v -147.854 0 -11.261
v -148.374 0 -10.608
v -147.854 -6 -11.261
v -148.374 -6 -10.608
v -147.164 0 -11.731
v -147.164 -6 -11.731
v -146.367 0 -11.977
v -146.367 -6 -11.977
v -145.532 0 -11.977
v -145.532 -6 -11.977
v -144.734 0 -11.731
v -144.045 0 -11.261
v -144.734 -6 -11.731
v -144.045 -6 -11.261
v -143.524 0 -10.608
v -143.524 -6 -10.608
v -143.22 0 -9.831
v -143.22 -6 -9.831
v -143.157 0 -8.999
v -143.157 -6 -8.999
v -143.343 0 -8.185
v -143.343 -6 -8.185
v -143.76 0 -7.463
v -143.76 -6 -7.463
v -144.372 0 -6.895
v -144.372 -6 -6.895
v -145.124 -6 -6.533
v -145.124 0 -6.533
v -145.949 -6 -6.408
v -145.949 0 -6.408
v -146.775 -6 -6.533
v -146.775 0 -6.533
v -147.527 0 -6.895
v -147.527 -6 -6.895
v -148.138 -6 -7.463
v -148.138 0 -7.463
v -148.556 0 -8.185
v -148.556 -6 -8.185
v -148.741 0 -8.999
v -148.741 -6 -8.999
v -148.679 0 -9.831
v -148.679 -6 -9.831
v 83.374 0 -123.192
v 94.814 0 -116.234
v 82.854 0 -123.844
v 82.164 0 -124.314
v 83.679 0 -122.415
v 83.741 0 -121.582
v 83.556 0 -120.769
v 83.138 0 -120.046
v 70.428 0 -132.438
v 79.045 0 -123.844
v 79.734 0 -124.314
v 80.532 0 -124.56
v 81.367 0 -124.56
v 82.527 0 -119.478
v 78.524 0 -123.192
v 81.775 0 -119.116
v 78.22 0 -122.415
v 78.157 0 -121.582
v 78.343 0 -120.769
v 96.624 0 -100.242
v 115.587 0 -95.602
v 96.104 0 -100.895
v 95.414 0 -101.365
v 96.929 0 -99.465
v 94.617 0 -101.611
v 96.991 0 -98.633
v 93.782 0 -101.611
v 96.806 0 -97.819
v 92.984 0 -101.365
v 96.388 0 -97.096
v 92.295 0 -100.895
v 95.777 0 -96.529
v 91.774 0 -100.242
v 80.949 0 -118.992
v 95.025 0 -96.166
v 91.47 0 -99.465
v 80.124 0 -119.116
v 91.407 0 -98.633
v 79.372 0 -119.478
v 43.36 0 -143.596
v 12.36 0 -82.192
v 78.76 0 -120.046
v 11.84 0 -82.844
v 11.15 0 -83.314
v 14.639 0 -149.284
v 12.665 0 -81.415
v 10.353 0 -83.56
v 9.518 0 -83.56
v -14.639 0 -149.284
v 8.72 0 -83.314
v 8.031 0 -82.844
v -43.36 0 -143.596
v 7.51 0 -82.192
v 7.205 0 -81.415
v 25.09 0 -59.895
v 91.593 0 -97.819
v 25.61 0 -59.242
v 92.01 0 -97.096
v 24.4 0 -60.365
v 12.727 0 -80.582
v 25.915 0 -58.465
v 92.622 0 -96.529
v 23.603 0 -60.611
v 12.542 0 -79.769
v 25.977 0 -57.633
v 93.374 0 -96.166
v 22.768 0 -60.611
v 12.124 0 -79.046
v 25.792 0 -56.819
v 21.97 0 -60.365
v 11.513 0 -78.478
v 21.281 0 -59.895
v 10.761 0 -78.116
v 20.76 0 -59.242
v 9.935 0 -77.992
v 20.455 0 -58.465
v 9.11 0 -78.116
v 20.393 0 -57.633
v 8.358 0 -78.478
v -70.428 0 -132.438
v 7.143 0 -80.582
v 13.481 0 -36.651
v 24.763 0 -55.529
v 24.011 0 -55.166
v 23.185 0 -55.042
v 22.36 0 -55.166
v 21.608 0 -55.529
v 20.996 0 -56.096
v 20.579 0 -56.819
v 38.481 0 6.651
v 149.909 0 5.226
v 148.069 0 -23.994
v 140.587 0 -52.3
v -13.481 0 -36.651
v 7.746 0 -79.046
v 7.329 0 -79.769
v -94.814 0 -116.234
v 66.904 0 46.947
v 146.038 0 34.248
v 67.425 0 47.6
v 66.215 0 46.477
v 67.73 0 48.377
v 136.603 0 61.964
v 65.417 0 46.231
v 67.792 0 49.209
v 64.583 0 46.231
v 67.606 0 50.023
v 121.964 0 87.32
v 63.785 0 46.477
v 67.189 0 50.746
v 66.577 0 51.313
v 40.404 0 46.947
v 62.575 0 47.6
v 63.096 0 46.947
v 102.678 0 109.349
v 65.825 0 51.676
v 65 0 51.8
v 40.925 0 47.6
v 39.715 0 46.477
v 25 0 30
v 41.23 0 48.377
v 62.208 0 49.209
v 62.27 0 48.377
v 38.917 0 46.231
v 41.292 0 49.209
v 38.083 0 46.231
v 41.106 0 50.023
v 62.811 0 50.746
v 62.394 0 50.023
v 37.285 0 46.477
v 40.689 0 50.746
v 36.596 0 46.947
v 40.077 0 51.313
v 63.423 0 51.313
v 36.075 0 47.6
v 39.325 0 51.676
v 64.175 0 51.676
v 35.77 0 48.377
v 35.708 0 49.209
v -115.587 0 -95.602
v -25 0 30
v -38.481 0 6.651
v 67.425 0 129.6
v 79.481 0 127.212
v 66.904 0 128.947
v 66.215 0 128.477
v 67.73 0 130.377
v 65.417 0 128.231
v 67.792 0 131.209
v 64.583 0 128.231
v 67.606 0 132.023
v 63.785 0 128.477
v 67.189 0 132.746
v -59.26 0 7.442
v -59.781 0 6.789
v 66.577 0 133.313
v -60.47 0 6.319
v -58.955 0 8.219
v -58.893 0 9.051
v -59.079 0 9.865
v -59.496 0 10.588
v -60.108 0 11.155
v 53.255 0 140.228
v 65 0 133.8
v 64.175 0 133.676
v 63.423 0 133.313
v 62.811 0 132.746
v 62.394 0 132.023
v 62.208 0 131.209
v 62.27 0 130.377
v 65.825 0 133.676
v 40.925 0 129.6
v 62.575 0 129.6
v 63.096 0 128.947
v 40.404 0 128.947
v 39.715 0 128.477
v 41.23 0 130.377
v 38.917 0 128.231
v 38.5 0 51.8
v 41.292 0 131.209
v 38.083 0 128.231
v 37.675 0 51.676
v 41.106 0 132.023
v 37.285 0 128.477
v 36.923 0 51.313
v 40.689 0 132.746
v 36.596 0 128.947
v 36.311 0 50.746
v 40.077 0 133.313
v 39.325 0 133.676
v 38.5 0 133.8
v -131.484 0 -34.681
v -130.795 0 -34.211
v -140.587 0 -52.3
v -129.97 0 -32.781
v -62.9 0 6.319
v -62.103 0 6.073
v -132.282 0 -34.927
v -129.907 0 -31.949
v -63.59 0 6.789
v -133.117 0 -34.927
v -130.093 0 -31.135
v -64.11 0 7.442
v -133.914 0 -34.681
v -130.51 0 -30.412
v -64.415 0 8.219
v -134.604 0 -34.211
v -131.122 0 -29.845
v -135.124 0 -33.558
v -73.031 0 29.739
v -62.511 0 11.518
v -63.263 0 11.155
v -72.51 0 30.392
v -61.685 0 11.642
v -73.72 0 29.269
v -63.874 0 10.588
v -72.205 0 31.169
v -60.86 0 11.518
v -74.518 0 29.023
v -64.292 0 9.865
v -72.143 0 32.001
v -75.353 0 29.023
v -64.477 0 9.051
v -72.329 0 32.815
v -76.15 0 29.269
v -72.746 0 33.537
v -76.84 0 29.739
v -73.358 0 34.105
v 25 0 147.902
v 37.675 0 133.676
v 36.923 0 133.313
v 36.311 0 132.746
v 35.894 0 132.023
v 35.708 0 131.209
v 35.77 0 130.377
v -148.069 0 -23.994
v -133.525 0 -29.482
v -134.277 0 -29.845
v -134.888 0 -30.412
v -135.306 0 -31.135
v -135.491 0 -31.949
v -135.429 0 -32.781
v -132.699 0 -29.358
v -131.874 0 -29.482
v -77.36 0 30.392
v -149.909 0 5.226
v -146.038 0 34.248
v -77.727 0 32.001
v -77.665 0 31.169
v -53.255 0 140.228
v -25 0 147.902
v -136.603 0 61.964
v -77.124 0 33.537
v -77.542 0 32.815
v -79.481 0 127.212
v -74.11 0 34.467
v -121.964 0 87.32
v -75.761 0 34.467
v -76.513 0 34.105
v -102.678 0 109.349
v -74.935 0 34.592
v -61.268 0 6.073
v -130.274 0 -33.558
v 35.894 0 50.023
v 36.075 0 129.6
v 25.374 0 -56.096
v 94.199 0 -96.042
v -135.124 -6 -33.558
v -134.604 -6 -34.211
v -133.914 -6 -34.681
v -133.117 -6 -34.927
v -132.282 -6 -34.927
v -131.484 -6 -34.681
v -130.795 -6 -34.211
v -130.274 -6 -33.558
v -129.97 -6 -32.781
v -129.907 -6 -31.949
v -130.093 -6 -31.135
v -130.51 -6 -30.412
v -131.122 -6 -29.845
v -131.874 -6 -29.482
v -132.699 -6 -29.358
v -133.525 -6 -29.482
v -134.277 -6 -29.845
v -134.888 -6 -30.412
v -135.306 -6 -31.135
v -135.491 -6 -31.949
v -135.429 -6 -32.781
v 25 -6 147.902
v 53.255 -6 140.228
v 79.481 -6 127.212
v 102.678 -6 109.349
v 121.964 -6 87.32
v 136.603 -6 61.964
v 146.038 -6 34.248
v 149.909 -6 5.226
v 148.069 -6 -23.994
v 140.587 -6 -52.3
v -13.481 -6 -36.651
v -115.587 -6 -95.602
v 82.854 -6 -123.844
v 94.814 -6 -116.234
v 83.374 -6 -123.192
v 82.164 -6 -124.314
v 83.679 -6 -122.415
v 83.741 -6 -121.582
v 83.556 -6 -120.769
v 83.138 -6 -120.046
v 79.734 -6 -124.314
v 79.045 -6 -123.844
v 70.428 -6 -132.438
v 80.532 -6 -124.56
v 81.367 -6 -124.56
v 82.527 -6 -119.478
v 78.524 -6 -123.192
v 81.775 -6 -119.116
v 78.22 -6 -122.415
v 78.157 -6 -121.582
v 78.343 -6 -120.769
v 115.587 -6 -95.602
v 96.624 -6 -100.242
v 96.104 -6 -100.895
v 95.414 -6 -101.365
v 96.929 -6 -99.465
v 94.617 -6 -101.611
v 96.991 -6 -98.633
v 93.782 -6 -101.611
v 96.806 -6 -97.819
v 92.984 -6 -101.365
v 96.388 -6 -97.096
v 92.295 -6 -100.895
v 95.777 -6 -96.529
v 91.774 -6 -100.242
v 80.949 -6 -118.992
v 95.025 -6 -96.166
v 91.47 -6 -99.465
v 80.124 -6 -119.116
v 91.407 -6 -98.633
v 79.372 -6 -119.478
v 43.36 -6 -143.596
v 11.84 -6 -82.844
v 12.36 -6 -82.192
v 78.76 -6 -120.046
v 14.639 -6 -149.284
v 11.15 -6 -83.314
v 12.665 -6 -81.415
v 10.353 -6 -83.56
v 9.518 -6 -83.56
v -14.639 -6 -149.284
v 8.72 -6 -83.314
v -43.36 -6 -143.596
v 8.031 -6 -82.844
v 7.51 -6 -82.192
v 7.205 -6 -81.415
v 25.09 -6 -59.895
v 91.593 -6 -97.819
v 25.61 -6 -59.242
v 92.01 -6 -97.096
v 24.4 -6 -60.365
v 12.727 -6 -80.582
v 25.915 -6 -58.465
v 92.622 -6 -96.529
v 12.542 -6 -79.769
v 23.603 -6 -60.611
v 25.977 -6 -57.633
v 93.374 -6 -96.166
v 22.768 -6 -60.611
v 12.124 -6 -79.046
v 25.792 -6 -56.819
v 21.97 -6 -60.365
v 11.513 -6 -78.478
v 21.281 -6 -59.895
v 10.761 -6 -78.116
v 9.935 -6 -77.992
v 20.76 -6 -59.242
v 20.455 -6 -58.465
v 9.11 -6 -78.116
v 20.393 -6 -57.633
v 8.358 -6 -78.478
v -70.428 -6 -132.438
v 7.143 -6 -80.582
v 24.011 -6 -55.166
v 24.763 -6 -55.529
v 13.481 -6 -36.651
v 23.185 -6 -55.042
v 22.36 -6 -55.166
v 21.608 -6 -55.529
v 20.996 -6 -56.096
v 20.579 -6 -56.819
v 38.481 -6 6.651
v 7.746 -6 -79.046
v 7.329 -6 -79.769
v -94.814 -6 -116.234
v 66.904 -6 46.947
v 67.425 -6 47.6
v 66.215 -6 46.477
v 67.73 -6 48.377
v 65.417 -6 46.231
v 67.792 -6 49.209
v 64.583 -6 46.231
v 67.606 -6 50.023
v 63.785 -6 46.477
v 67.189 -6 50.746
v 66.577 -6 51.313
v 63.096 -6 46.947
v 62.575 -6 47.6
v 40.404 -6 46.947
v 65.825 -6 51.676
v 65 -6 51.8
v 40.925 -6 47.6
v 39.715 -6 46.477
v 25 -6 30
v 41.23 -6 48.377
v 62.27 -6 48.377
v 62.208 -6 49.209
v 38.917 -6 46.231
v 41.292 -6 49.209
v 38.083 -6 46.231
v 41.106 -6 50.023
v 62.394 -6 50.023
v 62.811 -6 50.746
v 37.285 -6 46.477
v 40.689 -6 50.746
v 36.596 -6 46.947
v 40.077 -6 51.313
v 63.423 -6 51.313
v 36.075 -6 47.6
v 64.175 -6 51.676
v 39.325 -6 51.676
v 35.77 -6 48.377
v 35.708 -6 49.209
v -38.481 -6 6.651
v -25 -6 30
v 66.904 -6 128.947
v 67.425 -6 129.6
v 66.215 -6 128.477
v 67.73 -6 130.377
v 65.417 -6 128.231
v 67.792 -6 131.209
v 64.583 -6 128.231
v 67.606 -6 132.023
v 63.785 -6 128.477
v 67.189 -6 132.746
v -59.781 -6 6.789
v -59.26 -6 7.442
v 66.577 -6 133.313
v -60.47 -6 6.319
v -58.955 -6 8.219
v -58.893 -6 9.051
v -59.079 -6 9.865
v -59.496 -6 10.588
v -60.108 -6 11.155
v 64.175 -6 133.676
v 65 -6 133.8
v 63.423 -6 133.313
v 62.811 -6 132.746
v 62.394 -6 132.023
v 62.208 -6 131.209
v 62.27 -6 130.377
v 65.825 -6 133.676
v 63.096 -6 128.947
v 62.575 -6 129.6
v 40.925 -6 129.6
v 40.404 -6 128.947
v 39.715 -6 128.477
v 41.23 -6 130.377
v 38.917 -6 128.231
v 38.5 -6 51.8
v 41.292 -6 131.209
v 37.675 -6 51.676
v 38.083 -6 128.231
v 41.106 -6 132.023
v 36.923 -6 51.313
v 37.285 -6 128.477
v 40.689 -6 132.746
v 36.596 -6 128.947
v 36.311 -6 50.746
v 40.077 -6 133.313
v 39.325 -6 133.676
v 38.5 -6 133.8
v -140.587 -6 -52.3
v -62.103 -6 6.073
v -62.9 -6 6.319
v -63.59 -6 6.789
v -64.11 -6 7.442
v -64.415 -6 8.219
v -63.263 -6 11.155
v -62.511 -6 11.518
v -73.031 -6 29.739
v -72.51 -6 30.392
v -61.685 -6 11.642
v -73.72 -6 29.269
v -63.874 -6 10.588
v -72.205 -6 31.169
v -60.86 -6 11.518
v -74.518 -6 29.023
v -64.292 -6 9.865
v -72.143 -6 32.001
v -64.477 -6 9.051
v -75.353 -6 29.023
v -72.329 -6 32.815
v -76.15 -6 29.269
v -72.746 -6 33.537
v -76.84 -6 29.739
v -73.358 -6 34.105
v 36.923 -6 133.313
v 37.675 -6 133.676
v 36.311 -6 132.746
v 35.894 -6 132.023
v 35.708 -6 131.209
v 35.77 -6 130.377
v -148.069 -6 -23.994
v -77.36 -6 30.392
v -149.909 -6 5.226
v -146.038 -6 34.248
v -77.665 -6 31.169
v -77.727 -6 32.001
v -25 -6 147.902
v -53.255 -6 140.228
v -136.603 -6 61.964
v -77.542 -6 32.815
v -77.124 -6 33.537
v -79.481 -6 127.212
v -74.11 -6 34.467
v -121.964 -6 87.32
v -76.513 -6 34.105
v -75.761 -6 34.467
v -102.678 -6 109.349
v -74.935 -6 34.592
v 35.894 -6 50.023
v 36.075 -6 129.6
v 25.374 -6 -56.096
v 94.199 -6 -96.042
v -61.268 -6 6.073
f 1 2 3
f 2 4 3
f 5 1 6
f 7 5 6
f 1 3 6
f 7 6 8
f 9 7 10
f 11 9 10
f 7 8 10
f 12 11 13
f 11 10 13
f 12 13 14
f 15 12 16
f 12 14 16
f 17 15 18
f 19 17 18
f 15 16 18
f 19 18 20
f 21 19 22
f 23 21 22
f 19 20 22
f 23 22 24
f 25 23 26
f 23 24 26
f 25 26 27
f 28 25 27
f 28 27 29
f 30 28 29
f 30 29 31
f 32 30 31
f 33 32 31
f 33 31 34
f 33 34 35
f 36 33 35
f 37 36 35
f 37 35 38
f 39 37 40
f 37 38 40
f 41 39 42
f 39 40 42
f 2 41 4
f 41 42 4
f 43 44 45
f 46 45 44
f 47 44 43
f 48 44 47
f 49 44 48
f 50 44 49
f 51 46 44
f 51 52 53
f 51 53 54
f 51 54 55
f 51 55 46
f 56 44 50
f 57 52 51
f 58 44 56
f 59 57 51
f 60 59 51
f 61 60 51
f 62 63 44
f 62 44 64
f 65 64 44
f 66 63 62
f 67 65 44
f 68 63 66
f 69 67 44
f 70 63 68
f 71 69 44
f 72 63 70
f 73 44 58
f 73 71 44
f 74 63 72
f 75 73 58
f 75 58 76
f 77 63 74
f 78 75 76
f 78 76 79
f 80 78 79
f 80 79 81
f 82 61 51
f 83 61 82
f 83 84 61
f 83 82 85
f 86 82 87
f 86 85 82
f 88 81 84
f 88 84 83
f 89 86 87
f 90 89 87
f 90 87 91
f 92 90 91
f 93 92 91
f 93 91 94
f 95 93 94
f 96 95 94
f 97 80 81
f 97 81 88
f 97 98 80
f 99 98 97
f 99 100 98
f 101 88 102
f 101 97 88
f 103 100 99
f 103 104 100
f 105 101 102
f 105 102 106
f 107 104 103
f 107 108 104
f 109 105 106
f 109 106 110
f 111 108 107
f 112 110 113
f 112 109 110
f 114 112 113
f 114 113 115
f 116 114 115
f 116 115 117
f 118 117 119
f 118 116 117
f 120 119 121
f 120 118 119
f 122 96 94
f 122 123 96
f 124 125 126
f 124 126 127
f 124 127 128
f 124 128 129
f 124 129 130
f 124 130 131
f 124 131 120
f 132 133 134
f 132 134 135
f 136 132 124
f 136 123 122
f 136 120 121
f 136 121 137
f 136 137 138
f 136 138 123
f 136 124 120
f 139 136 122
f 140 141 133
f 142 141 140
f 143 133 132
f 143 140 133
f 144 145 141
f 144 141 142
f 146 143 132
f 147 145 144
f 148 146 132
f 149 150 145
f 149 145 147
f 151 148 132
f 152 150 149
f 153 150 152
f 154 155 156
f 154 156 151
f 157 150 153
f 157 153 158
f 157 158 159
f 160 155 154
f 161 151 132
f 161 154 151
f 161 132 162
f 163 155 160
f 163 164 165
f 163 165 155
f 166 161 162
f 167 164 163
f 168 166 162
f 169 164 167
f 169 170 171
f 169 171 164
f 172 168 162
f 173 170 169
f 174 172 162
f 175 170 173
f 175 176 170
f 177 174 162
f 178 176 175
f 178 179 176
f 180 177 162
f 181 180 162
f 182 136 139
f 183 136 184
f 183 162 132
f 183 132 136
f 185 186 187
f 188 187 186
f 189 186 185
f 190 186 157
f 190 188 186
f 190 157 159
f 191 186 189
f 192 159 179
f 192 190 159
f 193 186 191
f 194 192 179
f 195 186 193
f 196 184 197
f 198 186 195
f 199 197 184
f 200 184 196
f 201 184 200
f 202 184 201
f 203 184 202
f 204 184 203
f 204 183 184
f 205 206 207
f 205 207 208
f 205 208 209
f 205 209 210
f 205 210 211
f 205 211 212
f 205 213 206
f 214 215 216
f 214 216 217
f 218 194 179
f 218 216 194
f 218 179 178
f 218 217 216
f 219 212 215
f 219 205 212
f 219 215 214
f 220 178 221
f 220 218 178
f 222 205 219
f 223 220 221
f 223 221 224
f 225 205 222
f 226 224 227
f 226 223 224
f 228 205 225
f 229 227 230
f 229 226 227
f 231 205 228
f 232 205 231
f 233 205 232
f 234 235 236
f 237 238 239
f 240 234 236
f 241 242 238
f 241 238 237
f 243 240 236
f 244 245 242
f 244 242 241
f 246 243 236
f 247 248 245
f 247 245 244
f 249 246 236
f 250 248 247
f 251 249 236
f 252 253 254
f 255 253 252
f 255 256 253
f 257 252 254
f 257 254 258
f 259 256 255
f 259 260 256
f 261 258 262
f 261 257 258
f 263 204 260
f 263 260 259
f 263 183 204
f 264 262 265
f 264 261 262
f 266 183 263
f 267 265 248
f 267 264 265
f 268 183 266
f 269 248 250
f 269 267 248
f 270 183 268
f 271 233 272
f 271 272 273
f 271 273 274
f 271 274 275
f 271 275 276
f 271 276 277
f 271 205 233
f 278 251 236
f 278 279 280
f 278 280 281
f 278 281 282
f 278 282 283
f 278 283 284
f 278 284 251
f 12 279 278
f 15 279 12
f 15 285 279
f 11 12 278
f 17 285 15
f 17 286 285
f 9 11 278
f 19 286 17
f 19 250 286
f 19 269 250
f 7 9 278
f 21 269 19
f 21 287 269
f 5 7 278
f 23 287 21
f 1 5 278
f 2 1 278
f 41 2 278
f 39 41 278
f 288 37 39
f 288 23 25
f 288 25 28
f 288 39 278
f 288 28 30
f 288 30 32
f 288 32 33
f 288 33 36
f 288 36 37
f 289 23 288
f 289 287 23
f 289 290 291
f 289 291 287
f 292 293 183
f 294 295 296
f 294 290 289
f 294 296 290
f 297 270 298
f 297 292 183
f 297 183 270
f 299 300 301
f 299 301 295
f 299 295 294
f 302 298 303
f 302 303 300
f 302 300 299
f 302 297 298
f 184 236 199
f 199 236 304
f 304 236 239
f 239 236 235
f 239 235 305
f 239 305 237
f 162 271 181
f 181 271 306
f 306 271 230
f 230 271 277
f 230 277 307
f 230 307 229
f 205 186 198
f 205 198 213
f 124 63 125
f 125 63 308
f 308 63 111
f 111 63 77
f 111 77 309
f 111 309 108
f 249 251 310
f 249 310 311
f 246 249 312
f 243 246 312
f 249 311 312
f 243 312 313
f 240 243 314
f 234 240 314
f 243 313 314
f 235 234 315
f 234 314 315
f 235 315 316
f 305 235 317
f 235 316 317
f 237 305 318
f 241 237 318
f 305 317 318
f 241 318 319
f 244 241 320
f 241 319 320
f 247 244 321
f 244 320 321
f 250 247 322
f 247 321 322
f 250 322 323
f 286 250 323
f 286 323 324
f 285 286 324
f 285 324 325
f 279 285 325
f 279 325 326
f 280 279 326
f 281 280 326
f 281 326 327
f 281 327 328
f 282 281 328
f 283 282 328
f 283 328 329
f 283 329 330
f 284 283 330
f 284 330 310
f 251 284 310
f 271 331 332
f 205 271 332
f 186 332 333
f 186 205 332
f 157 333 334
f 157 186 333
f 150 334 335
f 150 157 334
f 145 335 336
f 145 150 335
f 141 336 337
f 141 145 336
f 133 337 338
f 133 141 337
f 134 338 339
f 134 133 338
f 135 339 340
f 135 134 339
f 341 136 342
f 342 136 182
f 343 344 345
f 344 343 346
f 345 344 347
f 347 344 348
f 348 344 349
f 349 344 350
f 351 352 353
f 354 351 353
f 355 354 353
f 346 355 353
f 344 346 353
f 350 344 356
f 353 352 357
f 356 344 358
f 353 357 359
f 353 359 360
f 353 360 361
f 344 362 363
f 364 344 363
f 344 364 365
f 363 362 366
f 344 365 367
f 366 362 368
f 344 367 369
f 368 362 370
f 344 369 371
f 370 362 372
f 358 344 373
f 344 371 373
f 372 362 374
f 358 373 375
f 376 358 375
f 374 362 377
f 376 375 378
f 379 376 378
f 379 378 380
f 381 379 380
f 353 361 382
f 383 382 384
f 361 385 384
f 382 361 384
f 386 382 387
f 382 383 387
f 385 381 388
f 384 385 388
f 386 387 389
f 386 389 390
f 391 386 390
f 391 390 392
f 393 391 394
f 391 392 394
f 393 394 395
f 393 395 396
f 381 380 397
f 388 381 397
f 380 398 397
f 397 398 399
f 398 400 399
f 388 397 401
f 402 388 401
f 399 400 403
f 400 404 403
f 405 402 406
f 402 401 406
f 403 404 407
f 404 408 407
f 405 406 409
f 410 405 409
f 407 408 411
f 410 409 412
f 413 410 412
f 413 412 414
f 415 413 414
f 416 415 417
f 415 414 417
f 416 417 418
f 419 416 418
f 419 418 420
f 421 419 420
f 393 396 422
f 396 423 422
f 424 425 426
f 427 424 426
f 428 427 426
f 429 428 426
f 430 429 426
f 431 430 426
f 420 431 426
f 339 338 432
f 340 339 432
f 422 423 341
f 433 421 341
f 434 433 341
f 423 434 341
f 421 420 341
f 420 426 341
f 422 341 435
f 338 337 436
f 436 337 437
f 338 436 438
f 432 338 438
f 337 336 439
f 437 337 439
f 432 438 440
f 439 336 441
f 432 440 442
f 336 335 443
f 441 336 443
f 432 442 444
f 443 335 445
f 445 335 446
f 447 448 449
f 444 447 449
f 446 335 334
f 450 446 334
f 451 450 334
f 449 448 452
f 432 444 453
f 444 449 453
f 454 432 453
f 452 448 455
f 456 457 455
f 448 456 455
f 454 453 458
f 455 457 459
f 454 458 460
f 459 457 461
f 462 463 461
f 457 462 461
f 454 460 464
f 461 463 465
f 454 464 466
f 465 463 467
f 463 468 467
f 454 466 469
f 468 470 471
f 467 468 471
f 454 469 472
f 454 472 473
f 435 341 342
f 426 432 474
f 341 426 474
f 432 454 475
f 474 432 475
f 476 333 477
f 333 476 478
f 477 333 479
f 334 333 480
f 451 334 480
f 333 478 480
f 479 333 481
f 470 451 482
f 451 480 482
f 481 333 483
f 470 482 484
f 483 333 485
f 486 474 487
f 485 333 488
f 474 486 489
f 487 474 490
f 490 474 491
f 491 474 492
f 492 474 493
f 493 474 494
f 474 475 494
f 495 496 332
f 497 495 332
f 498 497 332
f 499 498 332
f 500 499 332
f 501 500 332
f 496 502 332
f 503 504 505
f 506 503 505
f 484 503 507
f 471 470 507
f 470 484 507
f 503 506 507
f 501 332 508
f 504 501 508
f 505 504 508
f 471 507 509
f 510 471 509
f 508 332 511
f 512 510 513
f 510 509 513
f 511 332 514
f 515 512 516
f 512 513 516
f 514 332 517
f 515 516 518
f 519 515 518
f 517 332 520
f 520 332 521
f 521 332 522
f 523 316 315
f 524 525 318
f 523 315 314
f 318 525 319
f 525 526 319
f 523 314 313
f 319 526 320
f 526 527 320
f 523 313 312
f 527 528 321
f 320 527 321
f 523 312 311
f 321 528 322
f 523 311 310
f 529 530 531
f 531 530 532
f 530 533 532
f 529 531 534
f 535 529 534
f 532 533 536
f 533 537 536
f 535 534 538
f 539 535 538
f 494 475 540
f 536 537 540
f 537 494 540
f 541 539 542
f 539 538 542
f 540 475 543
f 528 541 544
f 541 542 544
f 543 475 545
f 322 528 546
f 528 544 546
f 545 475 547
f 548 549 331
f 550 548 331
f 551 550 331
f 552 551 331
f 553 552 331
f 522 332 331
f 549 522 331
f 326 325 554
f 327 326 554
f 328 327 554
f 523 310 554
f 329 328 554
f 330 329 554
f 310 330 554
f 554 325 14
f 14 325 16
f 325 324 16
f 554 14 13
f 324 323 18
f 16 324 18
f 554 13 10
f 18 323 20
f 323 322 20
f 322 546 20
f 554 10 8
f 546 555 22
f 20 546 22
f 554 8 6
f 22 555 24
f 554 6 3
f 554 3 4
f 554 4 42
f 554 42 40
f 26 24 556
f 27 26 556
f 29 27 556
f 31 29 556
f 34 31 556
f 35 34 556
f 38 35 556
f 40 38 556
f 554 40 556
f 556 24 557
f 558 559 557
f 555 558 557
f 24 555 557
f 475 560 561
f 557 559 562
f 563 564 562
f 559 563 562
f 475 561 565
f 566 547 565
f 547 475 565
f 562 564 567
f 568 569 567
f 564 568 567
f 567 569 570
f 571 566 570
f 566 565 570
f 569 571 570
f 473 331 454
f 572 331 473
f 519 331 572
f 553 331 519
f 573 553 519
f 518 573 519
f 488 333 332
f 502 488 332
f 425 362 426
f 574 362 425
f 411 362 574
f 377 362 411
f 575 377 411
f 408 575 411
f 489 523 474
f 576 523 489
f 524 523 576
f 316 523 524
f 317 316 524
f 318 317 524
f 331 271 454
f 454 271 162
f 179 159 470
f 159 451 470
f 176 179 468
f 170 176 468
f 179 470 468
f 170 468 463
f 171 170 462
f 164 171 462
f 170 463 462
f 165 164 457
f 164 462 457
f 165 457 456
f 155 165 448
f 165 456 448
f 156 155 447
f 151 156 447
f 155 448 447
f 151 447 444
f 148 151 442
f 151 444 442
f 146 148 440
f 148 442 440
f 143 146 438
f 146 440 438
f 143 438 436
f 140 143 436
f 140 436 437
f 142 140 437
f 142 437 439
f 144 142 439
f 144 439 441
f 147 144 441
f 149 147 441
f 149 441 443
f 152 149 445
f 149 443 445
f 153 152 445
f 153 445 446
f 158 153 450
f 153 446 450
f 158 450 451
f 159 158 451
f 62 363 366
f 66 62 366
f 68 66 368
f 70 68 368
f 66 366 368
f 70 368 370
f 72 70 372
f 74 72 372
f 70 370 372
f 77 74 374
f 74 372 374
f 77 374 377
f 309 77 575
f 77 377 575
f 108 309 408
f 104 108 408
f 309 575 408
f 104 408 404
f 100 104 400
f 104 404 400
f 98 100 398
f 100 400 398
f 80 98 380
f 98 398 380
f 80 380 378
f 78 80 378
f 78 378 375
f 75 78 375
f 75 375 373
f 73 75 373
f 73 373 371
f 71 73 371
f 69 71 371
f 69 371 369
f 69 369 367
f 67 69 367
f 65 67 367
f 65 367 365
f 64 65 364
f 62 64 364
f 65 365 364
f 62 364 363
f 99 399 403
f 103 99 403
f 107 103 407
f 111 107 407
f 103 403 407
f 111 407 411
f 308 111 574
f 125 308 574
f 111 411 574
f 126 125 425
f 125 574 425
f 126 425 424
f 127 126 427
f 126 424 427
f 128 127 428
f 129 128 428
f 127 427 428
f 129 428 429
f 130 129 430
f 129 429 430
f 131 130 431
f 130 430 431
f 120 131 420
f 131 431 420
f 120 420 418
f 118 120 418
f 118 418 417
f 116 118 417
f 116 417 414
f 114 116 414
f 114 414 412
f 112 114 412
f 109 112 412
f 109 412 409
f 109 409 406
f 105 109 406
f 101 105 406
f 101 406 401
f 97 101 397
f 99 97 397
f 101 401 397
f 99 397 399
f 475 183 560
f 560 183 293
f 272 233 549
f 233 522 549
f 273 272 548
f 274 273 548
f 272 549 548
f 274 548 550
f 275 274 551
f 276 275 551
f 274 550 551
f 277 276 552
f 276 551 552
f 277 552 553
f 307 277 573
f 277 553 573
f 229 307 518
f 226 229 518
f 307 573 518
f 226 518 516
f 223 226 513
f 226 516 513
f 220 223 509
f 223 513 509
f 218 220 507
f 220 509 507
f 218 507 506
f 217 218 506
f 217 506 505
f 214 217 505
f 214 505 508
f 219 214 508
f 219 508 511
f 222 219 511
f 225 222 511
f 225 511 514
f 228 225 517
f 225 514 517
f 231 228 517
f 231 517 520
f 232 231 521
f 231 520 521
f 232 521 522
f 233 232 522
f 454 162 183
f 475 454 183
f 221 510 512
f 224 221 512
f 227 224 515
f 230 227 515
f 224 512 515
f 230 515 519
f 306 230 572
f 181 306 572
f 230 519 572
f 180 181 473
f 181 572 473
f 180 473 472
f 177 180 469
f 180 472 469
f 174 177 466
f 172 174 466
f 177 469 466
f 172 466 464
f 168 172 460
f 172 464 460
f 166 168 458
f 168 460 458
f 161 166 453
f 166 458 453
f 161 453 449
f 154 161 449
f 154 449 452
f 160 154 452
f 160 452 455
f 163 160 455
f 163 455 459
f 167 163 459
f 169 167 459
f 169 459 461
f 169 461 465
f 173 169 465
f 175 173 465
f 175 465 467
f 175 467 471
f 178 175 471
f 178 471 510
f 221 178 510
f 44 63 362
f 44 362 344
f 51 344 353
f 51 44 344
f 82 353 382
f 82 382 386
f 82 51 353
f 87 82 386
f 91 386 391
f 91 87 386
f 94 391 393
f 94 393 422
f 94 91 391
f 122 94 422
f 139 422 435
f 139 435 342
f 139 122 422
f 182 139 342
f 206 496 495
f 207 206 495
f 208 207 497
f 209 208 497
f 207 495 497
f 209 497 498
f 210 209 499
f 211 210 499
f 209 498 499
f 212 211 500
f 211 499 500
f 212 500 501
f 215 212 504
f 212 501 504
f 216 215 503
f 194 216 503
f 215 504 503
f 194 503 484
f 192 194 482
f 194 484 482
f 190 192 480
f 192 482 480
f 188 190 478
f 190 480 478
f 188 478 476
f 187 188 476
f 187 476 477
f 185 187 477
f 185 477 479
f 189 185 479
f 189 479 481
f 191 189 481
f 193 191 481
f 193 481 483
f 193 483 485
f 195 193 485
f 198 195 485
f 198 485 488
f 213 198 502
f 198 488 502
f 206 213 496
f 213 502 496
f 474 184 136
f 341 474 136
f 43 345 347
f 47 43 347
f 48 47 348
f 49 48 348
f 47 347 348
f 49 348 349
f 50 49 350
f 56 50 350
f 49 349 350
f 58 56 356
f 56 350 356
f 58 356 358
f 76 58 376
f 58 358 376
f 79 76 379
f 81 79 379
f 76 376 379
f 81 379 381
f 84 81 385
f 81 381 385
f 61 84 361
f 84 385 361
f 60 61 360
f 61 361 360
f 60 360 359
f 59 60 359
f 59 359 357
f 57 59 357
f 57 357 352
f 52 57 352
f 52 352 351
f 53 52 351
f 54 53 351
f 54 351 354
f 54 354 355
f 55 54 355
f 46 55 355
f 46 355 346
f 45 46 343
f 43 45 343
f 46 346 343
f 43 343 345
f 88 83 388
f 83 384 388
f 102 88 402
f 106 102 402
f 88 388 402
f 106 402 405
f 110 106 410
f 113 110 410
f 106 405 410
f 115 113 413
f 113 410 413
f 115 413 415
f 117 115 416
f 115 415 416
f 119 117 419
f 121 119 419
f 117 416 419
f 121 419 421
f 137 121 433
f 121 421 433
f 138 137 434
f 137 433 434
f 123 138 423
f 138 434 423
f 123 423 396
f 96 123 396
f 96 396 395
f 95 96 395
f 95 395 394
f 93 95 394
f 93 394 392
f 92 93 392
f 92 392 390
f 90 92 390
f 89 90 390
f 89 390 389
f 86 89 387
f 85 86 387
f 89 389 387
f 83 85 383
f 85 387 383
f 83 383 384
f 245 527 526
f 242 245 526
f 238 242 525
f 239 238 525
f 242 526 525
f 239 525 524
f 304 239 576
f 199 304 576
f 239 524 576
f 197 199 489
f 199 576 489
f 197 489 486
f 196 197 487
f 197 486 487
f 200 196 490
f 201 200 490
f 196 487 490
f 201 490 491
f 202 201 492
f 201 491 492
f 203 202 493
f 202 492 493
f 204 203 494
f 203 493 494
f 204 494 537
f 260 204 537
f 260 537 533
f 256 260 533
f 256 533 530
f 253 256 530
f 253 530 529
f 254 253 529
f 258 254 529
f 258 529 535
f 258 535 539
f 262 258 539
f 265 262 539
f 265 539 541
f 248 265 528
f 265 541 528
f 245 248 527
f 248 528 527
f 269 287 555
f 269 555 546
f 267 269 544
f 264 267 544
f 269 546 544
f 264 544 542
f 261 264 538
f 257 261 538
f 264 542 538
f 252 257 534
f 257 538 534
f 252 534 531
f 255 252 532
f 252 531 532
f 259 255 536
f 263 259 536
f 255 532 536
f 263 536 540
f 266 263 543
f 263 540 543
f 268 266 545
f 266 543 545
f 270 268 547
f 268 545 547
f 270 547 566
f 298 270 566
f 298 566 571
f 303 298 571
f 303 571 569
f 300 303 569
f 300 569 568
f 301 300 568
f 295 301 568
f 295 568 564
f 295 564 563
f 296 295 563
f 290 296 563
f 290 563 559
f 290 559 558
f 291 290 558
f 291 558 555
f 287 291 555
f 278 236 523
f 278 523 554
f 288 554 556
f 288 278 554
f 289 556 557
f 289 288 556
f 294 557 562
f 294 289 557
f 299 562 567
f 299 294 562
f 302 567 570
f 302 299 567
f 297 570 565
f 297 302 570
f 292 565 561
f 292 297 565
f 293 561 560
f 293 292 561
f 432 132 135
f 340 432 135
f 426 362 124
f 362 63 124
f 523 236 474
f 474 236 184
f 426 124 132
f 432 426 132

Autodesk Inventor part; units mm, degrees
ref_plane "YZ Plane" through (0, 0, 0) normal (1, 0, 0) x (0, 1, 0)
ref_plane "XZ Plane" through (0, 0, 0) normal (0, 1, 0) x (-1, 0, 0)
ref_plane "XY Plane" through (0, 0, 0) normal (0, 0, 1) x (1, 0, 0)
sketch "Sketch1" plane through (0, 0, 0) normal (0, 1, 0) x (-1, 0, 0)
  circle A0 centre (0, 0) radius 90
  line L0 (-25, 120) -> (-25, 60)
  line L1 (-25, 60) -> (-145, 60)
  line L2 (-145, 60) -> (-145, 120)
  line L3 (-145, 120) -> (-25, 120)
  line L4 (-25, 90) -> (0, 90)
  line L5 (-65, 131) -> (-38.5, 131)
  line L6 (-38.5, 131) -> (-38.5, 49)
  line L7 (-38.5, 49) -> (-65, 49)
  line L8 (-65, 49) -> (-65, 131)
  line L9 (-38.5, 90) -> (-25, 90) construction
  circle A1 centre (0, 0) radius 150
  line L10 (-25, 30) -> (25, 30)
  line L11 (25, 30) -> (25, 150)
  line L12 (25, 150) -> (-25, 150)
  line L13 (-25, 150) -> (-25, 30)
  line L14 (-25, 30) -> (25, 150) construction
  line L15 (25, 30) -> (-25, 150) construction
  point P0 (-65, 62.2495)
  point P1 (-65, 60)
  point P2 (-67.082, 60)
  point P3 (25, 147.902)
  point P4 (-25, 147.902)
  dimension "d0" = 180
  dimension "d1" = 25
  dimension "d2" = 60
  dimension "d3" = 120
  dimension "d4" = 82
  dimension "d5" = 26.5
  dimension "d7" = 38.5
  dimension "d8" = 300
  dimension "d18" = 50
  dimension "d19" = 120
extrude "Extrusion1" add sketch "Sketch1" against normal blind 6 contours A0 L1 L8 L7 L6 L13 L10 L11 | A0 L11 A1 L1 | L11 L10 L13 L0 A0 | A0 L4 L0 L13 A1 L11 | L1 A1 L3 L8 A0 | A0 L8 L1 | A0 L0 L4 | L8 L3 L6 A0 | A0 L6 L1 L8 | L1 L6 L7 L8 | L0 L1 L6 A0 | A0 L6 L3 L0 | L8 L5 L6 L3 | L3 A1 L13 L6 L5 L8
hole "Hole1" at (65, 0, 131) at (38.5, 0, 131) at (65, 0, 49) at (38.5, 0, 49) direction (0, -1, 0) diameter 5.6 end through all
extrude "Extrusion2" cut sketch "Sketch1" against normal blind 6 contours L11 L10 L13 L0 A0 | A0 L4 L0 L13 A1 L11 | A0 L0 L4
pattern_circular "Circular Pattern1" count 3 over 360 about axis through (0, 0, 0) along (0, -1, 0) of "Hole1", "Extrusion2"
properties part number "TempPart1"
